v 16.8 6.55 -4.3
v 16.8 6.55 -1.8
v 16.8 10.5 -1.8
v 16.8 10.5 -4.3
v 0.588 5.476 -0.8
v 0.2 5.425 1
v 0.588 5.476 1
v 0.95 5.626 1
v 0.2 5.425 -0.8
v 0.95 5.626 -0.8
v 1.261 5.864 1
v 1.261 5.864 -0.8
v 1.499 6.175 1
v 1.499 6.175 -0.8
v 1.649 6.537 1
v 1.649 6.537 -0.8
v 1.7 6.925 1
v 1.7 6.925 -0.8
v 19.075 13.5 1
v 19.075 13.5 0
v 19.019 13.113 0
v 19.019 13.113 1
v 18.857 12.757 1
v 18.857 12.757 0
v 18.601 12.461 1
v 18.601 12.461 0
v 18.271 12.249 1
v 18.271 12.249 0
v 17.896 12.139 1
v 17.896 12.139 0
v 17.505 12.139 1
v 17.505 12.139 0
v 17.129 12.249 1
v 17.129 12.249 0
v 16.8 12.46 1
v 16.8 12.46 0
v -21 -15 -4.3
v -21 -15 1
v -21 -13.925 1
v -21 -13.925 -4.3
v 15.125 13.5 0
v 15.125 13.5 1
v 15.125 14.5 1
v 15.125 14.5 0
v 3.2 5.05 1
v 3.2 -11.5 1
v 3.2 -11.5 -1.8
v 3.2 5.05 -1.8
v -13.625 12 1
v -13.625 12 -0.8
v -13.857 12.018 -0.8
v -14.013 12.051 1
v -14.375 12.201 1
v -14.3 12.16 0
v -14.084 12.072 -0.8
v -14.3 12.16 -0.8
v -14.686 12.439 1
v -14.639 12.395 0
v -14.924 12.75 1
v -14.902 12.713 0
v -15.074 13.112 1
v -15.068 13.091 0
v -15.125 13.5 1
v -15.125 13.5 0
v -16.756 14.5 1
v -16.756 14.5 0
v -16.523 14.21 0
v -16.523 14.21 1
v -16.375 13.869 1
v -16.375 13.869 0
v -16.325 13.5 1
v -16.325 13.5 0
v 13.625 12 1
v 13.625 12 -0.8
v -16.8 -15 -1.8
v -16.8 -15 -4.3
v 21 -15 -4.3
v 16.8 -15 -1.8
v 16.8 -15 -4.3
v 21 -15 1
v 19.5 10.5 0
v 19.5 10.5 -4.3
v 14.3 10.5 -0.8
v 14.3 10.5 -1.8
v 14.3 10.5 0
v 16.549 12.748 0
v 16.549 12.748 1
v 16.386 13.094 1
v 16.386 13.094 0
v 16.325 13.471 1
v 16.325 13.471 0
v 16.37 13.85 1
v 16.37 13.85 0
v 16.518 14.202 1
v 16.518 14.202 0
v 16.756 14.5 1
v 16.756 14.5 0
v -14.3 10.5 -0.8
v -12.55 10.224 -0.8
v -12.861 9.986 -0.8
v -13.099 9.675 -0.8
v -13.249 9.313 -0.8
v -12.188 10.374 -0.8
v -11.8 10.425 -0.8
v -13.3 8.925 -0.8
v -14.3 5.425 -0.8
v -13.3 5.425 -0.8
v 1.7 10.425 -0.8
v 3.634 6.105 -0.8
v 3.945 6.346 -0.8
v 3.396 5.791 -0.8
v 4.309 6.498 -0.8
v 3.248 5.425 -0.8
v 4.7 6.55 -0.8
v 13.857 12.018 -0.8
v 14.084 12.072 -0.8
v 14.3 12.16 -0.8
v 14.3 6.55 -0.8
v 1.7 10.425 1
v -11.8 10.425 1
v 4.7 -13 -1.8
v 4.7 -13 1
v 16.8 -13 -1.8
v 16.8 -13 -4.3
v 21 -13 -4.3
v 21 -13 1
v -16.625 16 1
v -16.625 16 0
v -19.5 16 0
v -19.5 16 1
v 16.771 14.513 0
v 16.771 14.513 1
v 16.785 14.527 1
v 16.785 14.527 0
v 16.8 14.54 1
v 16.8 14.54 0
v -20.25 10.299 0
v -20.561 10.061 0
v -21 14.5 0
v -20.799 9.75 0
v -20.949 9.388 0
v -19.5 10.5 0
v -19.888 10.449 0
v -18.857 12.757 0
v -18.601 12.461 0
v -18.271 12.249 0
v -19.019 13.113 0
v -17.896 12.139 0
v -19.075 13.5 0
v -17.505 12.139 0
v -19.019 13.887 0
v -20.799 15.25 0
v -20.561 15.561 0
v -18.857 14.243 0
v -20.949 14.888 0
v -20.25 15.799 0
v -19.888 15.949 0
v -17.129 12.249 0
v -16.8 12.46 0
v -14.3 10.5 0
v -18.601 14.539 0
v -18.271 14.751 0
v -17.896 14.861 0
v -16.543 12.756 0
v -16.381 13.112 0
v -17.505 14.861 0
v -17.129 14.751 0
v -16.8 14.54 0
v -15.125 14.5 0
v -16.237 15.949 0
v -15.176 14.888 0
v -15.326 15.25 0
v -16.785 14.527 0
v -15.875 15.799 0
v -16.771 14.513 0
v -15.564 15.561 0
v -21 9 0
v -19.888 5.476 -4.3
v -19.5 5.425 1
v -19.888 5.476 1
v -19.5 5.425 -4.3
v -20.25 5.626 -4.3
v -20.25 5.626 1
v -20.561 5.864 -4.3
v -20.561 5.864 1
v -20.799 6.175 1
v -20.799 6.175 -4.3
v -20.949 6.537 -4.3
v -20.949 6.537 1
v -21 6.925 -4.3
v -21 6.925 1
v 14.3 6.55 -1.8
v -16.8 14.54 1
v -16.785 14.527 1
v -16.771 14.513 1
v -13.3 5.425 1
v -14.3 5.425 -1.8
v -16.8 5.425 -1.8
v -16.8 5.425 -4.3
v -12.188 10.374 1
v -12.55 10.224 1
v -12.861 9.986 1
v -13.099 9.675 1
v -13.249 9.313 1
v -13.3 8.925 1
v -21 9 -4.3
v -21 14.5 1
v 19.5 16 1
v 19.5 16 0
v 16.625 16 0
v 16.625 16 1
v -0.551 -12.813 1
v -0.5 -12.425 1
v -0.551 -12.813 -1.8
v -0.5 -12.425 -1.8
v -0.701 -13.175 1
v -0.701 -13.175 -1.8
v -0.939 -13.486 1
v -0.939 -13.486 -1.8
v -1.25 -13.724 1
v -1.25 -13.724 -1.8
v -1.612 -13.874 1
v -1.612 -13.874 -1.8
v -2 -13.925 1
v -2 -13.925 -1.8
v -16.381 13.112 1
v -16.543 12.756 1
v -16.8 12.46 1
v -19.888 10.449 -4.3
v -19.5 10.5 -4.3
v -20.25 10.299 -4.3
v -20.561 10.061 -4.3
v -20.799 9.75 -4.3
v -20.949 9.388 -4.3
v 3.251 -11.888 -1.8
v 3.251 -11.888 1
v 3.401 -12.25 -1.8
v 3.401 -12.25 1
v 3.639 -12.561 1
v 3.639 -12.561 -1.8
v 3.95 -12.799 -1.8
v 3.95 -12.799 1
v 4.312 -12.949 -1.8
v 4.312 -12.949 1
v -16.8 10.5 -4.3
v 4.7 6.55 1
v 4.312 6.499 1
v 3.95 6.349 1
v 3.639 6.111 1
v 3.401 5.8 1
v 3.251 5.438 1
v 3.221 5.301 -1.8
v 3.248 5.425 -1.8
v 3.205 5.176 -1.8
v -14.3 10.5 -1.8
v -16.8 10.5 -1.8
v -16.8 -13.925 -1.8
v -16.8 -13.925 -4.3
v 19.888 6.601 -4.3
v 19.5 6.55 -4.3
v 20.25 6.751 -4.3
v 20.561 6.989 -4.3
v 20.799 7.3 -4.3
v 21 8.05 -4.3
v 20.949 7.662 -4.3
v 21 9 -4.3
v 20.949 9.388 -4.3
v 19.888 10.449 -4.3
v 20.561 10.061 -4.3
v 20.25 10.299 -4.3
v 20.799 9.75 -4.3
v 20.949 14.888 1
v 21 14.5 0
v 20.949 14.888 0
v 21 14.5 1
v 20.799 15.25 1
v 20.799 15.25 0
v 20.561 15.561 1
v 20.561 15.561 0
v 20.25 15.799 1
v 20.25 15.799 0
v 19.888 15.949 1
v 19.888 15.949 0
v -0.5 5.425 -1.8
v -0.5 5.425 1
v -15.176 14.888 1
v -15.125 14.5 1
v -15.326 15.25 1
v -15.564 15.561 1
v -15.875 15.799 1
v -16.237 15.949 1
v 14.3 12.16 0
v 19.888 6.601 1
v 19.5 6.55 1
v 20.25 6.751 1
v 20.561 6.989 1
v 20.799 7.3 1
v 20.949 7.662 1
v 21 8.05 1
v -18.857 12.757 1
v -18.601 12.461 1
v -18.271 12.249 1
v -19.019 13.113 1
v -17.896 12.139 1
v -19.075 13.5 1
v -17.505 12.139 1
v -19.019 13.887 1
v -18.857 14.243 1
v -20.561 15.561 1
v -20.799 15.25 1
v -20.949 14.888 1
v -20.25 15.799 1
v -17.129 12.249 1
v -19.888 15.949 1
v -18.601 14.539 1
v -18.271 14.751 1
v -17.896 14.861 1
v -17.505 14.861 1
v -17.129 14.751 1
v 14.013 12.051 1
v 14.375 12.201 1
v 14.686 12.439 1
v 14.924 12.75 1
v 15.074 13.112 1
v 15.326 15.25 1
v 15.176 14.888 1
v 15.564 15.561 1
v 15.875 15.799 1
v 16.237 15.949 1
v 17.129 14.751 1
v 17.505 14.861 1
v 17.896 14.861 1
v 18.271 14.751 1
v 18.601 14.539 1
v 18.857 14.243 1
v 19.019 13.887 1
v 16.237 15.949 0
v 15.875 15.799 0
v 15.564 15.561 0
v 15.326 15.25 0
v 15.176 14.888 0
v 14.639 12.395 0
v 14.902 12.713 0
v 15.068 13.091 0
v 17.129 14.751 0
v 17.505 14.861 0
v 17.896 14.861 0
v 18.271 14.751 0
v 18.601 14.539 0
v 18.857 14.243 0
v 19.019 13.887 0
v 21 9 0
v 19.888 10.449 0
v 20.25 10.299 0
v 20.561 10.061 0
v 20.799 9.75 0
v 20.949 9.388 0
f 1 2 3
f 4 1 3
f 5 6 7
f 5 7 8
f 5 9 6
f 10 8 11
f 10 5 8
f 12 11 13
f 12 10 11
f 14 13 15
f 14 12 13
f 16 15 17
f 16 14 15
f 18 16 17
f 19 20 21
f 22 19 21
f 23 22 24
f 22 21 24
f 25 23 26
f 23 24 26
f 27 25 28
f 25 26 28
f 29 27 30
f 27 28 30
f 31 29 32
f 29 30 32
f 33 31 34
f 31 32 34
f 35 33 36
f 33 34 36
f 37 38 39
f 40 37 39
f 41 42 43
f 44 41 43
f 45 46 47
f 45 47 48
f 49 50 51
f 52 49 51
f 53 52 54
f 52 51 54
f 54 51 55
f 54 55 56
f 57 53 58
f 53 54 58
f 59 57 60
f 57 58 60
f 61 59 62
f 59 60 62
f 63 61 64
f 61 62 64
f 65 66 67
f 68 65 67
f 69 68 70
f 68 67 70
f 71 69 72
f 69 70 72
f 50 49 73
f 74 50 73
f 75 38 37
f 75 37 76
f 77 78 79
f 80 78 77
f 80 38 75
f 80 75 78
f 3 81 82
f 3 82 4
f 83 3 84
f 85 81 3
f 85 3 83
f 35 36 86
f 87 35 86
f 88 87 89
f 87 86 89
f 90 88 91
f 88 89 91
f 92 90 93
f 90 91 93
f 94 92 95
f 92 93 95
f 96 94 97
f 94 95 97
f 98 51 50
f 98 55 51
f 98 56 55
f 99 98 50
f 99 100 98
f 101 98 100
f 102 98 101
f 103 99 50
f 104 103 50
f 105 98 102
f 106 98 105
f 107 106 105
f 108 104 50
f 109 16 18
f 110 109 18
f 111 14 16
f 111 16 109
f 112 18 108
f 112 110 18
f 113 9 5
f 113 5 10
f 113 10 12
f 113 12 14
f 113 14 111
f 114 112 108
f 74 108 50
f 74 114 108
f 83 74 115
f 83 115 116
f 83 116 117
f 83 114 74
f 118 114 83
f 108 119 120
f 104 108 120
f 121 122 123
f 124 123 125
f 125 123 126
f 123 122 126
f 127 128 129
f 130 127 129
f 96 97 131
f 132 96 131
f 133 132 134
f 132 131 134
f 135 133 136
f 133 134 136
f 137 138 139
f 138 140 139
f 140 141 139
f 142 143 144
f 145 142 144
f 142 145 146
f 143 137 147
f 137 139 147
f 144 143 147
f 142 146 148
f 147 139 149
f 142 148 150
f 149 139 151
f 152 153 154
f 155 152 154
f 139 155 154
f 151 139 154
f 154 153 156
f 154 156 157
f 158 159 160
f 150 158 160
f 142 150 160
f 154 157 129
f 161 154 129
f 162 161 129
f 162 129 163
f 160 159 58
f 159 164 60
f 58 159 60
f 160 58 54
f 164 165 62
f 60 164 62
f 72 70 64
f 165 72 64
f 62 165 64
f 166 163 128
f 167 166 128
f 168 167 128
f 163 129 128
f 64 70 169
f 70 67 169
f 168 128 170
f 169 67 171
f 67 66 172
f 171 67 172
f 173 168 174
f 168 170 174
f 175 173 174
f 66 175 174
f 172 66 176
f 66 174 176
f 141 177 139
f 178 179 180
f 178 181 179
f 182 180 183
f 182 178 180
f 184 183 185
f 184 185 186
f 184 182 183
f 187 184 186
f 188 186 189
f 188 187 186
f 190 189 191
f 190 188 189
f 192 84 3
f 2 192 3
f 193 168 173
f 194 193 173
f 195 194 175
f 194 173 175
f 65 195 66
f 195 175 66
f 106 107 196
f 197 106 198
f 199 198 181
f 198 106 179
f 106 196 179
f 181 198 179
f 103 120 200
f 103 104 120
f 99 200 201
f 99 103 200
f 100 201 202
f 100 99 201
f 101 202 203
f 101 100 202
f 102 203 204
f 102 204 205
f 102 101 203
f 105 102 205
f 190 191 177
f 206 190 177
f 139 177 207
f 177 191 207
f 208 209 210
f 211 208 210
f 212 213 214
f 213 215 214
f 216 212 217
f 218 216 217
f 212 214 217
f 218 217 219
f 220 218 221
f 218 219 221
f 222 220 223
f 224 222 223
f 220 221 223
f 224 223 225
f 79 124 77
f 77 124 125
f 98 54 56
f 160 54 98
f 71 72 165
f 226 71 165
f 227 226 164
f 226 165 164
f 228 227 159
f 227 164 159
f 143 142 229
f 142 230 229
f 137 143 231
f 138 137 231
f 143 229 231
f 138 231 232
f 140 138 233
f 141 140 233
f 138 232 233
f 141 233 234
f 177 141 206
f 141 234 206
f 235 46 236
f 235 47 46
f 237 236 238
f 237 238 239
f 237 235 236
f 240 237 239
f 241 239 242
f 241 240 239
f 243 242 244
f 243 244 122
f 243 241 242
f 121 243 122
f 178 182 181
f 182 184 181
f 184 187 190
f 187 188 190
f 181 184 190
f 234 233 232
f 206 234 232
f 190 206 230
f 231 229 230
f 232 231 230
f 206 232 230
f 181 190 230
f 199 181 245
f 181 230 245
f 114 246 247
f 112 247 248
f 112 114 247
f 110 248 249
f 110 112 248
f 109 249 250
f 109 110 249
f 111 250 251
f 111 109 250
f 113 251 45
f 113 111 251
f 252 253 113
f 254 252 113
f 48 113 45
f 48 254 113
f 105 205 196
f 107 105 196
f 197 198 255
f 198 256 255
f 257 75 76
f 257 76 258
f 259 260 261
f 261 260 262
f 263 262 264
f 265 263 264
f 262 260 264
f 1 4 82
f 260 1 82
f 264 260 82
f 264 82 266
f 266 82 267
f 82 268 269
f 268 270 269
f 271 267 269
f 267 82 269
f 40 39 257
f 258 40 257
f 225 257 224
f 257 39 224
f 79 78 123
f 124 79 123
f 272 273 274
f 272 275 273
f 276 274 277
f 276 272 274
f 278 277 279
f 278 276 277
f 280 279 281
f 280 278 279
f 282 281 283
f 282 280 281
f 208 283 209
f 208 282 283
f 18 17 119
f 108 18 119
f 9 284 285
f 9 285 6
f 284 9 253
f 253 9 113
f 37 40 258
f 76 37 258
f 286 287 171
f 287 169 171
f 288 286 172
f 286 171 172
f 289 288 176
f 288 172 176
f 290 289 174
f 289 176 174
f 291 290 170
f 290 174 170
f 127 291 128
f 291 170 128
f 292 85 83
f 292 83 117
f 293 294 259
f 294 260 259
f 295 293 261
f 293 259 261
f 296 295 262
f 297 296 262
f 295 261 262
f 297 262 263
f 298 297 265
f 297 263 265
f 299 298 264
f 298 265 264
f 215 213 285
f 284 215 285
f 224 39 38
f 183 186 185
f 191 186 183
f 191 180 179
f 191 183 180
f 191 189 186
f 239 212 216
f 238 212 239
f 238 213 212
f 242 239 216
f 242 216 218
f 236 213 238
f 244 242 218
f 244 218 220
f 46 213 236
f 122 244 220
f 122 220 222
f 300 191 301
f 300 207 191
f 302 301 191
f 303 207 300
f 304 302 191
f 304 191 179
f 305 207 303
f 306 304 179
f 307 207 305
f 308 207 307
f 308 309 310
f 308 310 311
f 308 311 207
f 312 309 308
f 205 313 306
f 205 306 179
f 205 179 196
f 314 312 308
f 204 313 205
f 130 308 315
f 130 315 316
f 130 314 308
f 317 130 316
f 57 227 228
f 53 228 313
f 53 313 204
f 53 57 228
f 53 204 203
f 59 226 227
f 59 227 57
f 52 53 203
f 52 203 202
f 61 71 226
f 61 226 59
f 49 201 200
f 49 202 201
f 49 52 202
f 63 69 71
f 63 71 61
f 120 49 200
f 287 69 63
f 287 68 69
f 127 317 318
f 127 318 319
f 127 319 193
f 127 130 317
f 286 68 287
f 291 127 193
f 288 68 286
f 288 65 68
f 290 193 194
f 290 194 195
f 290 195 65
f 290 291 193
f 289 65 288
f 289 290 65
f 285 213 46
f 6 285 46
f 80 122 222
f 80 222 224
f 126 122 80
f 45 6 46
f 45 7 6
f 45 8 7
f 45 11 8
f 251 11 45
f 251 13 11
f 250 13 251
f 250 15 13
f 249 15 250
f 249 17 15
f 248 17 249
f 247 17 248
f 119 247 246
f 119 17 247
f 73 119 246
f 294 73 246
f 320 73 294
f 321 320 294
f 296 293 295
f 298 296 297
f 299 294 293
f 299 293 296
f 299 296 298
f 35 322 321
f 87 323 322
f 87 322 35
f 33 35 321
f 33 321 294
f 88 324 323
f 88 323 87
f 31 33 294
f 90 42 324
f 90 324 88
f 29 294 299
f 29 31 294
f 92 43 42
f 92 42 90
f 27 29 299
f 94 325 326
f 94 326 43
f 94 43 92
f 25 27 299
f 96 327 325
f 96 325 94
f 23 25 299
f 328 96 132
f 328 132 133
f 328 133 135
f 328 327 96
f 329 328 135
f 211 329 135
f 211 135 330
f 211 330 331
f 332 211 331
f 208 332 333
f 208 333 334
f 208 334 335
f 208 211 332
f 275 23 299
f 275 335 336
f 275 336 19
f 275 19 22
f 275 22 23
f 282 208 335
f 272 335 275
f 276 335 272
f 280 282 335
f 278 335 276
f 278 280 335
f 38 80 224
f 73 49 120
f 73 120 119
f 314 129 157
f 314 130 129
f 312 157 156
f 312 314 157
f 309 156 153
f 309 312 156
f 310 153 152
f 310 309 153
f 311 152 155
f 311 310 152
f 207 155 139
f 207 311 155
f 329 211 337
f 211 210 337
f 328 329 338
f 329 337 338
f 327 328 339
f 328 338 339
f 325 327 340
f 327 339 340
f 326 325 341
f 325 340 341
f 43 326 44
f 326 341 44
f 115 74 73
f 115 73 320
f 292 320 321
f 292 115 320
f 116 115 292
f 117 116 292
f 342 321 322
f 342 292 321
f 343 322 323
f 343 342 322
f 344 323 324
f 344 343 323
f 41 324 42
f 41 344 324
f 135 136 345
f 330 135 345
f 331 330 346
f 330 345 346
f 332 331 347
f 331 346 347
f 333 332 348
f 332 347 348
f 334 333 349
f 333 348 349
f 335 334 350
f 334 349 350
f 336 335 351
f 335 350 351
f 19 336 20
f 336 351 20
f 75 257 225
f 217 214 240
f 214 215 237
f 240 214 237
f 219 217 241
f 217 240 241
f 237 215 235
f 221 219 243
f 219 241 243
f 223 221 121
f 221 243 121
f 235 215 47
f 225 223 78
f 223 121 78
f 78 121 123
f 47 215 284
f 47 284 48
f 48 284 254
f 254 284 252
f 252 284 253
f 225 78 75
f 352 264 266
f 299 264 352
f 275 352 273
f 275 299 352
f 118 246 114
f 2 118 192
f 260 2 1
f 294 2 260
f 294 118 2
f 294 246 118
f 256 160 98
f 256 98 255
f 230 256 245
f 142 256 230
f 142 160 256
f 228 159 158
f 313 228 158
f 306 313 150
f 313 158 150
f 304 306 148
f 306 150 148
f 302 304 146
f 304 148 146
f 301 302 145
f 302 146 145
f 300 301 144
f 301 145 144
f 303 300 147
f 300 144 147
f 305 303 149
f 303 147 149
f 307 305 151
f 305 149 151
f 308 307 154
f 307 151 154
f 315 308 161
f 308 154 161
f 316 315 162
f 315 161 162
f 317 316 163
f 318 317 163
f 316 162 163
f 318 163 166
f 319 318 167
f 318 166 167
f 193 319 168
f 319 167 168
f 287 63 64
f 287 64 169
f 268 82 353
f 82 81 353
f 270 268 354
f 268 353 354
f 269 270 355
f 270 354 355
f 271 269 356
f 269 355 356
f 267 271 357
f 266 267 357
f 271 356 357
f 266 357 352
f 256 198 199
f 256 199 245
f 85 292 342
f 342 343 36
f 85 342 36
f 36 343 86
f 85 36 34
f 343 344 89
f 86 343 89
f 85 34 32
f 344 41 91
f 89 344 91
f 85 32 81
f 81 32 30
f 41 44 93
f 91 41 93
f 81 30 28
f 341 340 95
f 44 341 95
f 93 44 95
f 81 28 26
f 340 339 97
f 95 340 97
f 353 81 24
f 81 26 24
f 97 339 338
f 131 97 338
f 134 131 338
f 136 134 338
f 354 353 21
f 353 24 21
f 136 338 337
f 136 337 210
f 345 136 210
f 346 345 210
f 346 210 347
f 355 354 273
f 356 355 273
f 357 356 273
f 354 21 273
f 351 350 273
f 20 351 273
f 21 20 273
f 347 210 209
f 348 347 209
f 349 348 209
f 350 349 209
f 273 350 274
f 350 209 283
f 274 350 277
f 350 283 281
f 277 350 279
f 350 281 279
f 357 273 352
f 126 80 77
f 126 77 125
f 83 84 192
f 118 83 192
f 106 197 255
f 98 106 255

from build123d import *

# Parameters (mm, degrees)
F0_W     = 4.2
F0_H     = 26.5
F0_W_2   = 23.9
F0_H_2   = 1.5
F1_DEPTH = 1
F2_DEPTH = 1.8
F3_DEPTH = 4.3
F4_W     = 17.8
F4_H     = 19.55
F4_W_2   = 30.25
F4_H_2   = 4
F4_W_3   = 42
F4_H_3   = 1
F5_DEPTH = 5.301
F7_DEPTH = 1
F8_R     = 1.5


with BuildPart() as f1:
    # F0 (on Top) → F1 (new body)
    with BuildSketch(Plane.XY):
        with Locations((18.9, -2.75)):
            Rectangle(F0_W, F0_H)
        Polygon((-16.8, -16), (16.8, -16), (16.8, 10.5), (14.3, 10.5), (14.3, 14.5), (11.95, 14.5), (-11.95, 14.5), (-14.3, 14.5), (-14.3, 10.5), (-16.8, 10.5), align=None)
        with BuildLine():
            Line((16.8, 10.5), (21, 10.5))
            Line((21, 10.5), (21, 16))
            Line((21, 16), (16.8, 16))
            Line((16.8, 16), (16.8, 14.5395311443))
            ThreePointArc((16.8, 14.5395311443), (18.2714564725, 14.7506248438), (19.075, 13.5))
            ThreePointArc((19.075, 13.5), (18.2714564725, 12.2493751562), (16.8, 12.4604688557))
            Line((16.8, 12.4604688557), (16.8, 10.5))
        make_face()
        with Locations((-18.9, -2.75)):
            Rectangle(F0_W, F0_H)
        with BuildLine():
            Line((14.3, 10.5), (16.8, 10.5))
            Line((16.8, 10.5), (16.8, 12.4604688557))
            ThreePointArc((16.8, 12.4604688557), (16.3253159421, 13.4705255898), (16.7562706956, 14.5))
            Line((16.7562706956, 14.5), (14.3, 14.5))
            Line((14.3, 14.5), (14.3, 10.5))
        make_face()
        with BuildLine():
            Line((-21, 10.5), (-16.8, 10.5))
            Line((-16.8, 10.5), (-16.8, 12.4604688557))
            ThreePointArc((-16.8, 12.4604688557), (-19.075, 13.5), (-16.8, 14.5395311443))
            Line((-16.8, 14.5395311443), (-16.8, 16))
            Line((-16.8, 16), (-21, 16))
            Line((-21, 16), (-21, 10.5))
        make_face()
        with BuildLine():
            Line((-16.8, 12.4604688557), (-16.8, 10.5))
            Line((-16.8, 10.5), (-14.3, 10.5))
            Line((-14.3, 10.5), (-14.3, 14.5))
            Line((-14.3, 14.5), (-16.7562706956, 14.5))
            ThreePointArc((-16.7562706956, 14.5), (-16.4374128162, 14.044516853), (-16.325, 13.5))
            ThreePointArc((-16.325, 13.5), (-16.4493751562, 12.9285435275), (-16.8, 12.4604688557))
        make_face()
        with BuildLine():
            Line((16.8, 14.5395311443), (16.8, 16))
            Line((16.8, 16), (11.95, 16))
            Line((11.95, 16), (11.95, 14.5))
            Line((11.95, 14.5), (14.3, 14.5))
            Line((14.3, 14.5), (16.7562706956, 14.5))
            ThreePointArc((16.7562706956, 14.5), (16.7779234767, 14.5199999437), (16.8, 14.5395311443))
        make_face()
        with Locations((0, 15.25)):
            Rectangle(F0_W_2, F0_H_2)
        with BuildLine():
            Line((-16.8, 16), (-16.8, 14.5395311443))
            ThreePointArc((-16.8, 14.5395311443), (-16.7779234767, 14.5199999437), (-16.7562706956, 14.5))
            Line((-16.7562706956, 14.5), (-14.3, 14.5))
            Line((-14.3, 14.5), (-11.95, 14.5))
            Line((-11.95, 14.5), (-11.95, 16))
            Line((-11.95, 16), (-16.8, 16))
        make_face()
    extrude(amount=F1_DEPTH)

    # F0 (on Top) → F2 (join)
    with BuildSketch(Plane.XY):
        with Locations((18.9, -2.75)):
            Rectangle(F0_W, F0_H)
        Polygon((-16.8, -16), (16.8, -16), (16.8, 10.5), (14.3, 10.5), (14.3, 14.5), (11.95, 14.5), (-11.95, 14.5), (-14.3, 14.5), (-14.3, 10.5), (-16.8, 10.5), align=None)
        with Locations((-18.9, -2.75)):
            Rectangle(F0_W, F0_H)
    extrude(amount=-F2_DEPTH)

    # F0 (on Top) → F3 (join)
    with BuildSketch(Plane.XY):
        with Locations((-18.9, -2.75)):
            Rectangle(F0_W, F0_H)
        with Locations((18.9, -2.75)):
            Rectangle(F0_W, F0_H)
    extrude(amount=-F3_DEPTH)

    # F4 (on face) → F5 (cut, through all)
    with BuildSketch(Plane.XY.offset(1)):
        Polygon((-21, 5.425), (-21, -13.925), (-0.5, -13.925), (-0.5, 5.425), (-13.3, 5.425), align=None)
        with Locations((12.1, -3.225)):
            Rectangle(F4_W, F4_H)
        with Locations((0, 14)):
            Rectangle(F4_W_2, F4_H_2)
        Polygon((-13.3, 5.425), (-0.5, 5.425), (1.7, 5.425), (1.7, 10.425), (-13.3, 10.425), align=None)
        with Locations((0, -15.5)):
            Rectangle(F4_W_3, F4_H_3)
    extrude(amount=-F5_DEPTH, mode=Mode.SUBTRACT)

    # F6 (on face) → F7 (cut)
    with BuildSketch(Plane(origin=(0, 0, -1.8), x_dir=(1, 0, 0), z_dir=(0, 0, -1))):
        Polygon((-13.3, -5.425), (-14.3, -5.425), (-14.3, -10.5), (-14.3, -12), (14.3, -12), (14.3, -10.5), (14.3, -6.55), (3.2, -6.55), (3.2, -5.425), (1.7, -5.425), (1.7, -10.425), (-13.3, -10.425), align=None)
    extrude(amount=-F7_DEPTH, mode=Mode.SUBTRACT)

    # F8
    f8_edges = [f1.edges().sort_by_distance(p)[0] for p in [
        (-21, 16, 0.5),
        (21, 16, 0.5),
        (21, 10.5, -2.15),
        (-21, 10.5, -2.15),
        (-21, 5.425, -1.65),
        (21, 6.55, -1.65),
        (-15.125, 16, 0.5),
        (15.125, 16, 0.5),
        (15.125, 12, 0.5),
        (-15.125, 12, 0.5),
        (3.2, 6.55, 0.1),
        (3.2, -13, -0.4),
        (-0.5, -13.925, -0.4),
        (-13.3, 10.425, 0.1),
        (1.7, 5.425, 0.1),
    ]]
    fillet(f8_edges, radius=F8_R)


solid = f1.part
